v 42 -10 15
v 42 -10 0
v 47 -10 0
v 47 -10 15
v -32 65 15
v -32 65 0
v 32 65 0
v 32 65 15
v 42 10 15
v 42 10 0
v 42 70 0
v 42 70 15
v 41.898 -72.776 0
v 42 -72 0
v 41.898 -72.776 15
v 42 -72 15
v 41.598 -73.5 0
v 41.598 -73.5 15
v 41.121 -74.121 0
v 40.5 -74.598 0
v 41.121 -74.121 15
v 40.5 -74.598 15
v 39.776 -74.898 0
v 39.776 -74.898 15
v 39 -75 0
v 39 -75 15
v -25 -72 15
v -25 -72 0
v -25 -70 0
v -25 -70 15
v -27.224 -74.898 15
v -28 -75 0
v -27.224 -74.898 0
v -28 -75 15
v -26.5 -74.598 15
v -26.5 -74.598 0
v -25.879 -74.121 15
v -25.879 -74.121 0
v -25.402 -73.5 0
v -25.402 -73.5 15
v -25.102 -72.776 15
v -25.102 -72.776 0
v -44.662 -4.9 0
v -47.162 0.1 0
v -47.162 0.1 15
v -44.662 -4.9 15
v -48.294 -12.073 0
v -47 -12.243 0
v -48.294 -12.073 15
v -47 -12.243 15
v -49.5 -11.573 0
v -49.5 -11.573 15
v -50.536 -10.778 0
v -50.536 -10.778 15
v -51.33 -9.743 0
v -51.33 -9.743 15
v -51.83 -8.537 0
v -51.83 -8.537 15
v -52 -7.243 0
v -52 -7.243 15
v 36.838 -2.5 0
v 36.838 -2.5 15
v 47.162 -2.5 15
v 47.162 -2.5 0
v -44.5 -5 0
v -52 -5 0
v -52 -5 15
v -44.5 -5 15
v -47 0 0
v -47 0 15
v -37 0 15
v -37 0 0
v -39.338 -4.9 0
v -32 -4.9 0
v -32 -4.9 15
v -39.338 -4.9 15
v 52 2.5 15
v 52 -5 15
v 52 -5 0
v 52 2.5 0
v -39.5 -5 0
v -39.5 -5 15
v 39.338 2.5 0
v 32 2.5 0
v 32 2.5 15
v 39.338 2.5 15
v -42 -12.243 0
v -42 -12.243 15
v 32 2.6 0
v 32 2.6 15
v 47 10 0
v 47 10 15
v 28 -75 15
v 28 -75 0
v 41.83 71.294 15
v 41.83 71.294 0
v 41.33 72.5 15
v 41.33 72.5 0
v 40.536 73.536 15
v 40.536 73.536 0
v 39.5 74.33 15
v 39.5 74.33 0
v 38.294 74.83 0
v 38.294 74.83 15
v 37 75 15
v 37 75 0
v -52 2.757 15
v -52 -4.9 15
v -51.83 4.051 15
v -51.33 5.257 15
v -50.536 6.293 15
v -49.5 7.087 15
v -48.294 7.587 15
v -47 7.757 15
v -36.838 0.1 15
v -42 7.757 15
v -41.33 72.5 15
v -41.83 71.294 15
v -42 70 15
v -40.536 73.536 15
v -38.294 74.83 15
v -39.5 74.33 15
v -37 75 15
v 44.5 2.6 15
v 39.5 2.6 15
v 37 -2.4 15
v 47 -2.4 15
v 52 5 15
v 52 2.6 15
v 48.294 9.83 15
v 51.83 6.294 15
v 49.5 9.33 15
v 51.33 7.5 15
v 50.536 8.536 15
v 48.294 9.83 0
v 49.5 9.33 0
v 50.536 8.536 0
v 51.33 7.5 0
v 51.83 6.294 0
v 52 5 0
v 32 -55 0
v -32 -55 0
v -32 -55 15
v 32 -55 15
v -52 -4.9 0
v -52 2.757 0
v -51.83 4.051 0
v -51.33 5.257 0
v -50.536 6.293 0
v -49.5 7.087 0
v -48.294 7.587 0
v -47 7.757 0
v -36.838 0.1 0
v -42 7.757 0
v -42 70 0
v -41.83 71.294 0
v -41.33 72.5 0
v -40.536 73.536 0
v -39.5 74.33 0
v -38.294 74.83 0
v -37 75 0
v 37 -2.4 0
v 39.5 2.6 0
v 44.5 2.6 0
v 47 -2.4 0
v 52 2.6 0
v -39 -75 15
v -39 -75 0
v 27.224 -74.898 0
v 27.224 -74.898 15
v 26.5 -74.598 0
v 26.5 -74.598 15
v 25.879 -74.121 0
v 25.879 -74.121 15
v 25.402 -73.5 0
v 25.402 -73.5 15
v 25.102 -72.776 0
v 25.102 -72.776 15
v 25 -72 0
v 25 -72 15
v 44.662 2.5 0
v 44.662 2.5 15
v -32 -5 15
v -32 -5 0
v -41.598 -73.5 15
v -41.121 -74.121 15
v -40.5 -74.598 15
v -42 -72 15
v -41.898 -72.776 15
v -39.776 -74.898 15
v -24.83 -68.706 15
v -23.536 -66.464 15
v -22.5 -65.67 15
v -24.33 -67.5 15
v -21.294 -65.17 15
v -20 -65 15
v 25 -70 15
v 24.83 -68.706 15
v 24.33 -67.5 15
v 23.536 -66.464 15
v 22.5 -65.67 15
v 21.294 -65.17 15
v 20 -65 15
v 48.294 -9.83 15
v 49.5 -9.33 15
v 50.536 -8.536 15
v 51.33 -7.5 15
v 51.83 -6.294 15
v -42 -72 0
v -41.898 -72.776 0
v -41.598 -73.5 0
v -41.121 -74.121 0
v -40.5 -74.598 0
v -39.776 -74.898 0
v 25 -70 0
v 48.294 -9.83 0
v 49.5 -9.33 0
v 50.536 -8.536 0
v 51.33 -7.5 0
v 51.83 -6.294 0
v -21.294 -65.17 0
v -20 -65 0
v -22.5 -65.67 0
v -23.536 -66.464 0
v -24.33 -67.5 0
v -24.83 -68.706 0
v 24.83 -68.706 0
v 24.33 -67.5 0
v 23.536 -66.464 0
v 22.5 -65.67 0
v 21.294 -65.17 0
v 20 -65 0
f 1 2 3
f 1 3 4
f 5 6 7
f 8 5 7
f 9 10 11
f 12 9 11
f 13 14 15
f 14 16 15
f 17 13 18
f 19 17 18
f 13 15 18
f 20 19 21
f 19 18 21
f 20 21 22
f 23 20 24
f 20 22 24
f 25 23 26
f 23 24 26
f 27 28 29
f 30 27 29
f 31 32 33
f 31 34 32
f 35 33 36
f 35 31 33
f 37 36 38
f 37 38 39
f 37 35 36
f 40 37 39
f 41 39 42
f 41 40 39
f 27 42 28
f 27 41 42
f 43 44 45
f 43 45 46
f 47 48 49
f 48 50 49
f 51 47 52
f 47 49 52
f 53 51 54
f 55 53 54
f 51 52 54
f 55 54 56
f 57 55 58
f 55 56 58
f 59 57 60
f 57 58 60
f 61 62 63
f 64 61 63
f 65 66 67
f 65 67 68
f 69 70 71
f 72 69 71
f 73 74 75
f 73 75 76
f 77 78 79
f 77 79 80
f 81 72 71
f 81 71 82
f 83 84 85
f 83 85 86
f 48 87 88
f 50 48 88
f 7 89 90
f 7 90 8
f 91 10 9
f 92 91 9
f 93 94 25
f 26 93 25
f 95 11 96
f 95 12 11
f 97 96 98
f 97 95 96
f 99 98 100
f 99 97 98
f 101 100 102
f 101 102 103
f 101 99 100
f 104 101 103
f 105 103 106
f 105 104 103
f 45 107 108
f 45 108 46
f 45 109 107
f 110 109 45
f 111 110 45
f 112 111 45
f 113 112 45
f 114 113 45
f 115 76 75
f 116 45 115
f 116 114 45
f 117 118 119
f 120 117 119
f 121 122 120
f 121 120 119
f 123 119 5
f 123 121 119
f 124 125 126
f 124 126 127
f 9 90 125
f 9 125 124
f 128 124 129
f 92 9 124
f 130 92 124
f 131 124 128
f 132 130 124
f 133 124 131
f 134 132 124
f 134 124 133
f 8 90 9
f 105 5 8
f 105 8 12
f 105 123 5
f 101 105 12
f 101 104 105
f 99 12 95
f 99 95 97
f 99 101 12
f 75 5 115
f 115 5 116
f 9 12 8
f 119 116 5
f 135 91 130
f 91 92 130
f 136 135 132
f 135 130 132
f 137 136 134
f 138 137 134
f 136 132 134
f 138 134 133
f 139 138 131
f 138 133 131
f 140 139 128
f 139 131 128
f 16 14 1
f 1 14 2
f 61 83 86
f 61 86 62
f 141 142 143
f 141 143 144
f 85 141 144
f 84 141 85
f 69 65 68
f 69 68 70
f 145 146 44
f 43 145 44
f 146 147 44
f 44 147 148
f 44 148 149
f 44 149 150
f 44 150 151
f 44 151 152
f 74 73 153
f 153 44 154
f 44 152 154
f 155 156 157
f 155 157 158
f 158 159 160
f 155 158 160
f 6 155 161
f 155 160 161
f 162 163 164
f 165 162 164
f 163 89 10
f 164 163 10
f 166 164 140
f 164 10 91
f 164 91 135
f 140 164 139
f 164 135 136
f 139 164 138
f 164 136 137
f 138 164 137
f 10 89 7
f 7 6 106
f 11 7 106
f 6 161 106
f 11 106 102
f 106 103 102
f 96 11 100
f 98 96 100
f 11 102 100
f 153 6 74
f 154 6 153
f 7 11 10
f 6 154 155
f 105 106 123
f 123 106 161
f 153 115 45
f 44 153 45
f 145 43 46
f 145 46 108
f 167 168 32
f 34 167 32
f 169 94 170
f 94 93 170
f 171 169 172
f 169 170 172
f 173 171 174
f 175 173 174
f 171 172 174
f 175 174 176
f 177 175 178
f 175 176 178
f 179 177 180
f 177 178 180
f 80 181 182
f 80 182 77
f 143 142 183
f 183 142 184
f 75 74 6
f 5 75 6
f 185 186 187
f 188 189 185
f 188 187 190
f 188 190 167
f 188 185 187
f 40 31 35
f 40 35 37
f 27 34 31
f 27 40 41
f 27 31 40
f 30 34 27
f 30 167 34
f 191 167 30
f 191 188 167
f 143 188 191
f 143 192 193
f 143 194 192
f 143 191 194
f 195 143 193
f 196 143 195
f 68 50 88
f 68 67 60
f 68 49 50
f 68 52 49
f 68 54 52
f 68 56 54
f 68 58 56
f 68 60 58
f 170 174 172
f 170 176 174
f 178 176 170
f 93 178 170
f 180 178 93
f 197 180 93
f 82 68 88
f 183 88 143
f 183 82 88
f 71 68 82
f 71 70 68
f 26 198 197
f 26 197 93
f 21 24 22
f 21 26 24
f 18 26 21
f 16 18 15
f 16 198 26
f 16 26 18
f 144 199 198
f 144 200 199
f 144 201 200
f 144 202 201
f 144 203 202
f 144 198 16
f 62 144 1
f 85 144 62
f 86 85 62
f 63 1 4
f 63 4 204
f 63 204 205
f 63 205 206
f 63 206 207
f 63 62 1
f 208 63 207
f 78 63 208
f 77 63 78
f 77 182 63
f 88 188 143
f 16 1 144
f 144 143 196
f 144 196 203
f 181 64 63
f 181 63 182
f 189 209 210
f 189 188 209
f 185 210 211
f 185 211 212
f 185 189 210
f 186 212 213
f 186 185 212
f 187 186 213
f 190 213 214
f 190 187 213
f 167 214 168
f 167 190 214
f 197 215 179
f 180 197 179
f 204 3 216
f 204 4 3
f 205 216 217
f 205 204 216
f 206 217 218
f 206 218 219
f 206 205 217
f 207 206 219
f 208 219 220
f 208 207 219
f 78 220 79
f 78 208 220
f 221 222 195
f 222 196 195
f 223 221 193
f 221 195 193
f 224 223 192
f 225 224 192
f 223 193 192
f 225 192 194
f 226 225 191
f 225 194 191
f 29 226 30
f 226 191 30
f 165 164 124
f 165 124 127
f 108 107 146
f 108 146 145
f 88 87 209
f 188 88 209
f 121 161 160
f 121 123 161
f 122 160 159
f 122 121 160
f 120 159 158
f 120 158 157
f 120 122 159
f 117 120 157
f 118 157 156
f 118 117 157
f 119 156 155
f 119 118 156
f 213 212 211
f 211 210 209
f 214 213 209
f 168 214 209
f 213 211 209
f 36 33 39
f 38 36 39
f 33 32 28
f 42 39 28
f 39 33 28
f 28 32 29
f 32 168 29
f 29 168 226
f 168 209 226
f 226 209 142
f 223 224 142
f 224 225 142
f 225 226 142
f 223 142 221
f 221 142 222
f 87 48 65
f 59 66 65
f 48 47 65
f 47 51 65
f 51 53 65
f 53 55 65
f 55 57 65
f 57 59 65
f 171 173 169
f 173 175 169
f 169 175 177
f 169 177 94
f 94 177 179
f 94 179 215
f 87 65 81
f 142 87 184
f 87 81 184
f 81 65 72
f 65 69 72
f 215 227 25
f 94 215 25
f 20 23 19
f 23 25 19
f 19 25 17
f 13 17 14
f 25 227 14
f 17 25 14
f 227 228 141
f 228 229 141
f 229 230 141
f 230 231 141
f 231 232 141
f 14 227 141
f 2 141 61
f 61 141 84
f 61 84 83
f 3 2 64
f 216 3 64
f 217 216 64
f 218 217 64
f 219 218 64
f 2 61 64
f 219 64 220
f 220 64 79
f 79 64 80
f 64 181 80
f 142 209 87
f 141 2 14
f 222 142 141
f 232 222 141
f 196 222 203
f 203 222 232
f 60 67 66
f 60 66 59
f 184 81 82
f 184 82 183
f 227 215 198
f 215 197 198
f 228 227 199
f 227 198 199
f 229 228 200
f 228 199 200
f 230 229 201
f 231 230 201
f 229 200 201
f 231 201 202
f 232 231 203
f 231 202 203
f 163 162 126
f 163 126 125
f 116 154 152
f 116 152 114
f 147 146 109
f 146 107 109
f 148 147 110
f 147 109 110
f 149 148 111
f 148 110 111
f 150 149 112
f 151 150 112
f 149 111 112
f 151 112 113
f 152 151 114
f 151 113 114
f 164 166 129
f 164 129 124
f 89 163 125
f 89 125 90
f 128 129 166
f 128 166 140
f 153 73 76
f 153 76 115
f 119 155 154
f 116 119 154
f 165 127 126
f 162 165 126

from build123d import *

# Parameters (mm, degrees)
F0_W          = 64
F0_H          = 120
F1_DEPTH      = 15
F2_R          = 3
F3_R          = 5
F4_W          = 20
F4_H          = 15
F5_DEPTH      = 10
F6_W          = 20
F6_H          = 15
F7_DEPTH      = 10
F9_DEPTH      = 15.001
F9_DEPTH_BACK = 191
F10_R         = 5


# Not quite as in the source:
# - an extrude ends at something that could not be found from the text; its depth is read off the source's solid


with BuildPart() as f1:
    # F0 (on Top) → F1 (new body)
    with BuildSketch(Plane.XY):
        Polygon((42, -75), (42, 75), (-42, 75), (-42, -75), (-25, -75), (-25, -65), (25, -65), (25, -75), align=None)
        with Locations((0, 5)):
            Rectangle(F0_W, F0_H, mode=Mode.SUBTRACT)
    extrude(amount=F1_DEPTH)

    # F2
    f2_edges = [f1.edges().sort_by_distance(p)[0] for p in [
        (25, -75, 7.5),
        (42, -75, 7.5),
        (-25, -75, 7.5),
        (-42, -75, 7.5),
    ]]
    fillet(f2_edges, radius=F2_R)

    # F3
    f3_edges = [f1.edges().sort_by_distance(p)[0] for p in [
        (-25, -65, 7.5),
        (25, -65, 7.5),
        (-42, 75, 7.5),
        (42, 75, 7.5),
    ]]
    fillet(f3_edges, radius=F3_R)

    # F4 (on face) → F5 (join)
    with BuildSketch(Plane(origin=(-42, 0, 0), x_dir=(0, -1, 0), z_dir=(-1, 0, 0))):
        with Locations((2.2429061755, 7.5)):
            Rectangle(F4_W, F4_H)
    extrude(amount=F5_DEPTH)

    # F6 (on face) → F7 (join)
    with BuildSketch(Plane.YZ.offset(42)):
        with Locations((0, 7.5)):
            Rectangle(F6_W, F6_H)
    extrude(amount=F7_DEPTH)

    # F8 (on face) → F9 (cut, two sides)
    with BuildSketch(Plane.XY.offset(15)) as f9_sk:
        Polygon((-44.5, -5), (-47, 0), (-37, 0), (-39.5, -5), (-31.7807010276, -5), (-31.188910827, -5), (-31.188910827, -4.9), (-39.3381966011, -4.9), (-36.8381966011, 0.1), (-47.1618033989, 0.1), (-44.6618033989, -4.9), (-53.2719284122, -4.9), (-53.2719284122, -5), align=None)
        Polygon((44.6618033989, 2.5), (52.811089173, 2.5), (52.811089173, 2.6), (44.5, 2.6), (47, -2.4), (37, -2.4), (39.5, 2.6), (30.7280715878, 2.6), (30.7280715878, 2.5), (39.3381966011, 2.5), (36.8381966011, -2.5), (47.1618033989, -2.5), align=None)
    extrude(amount=-F9_DEPTH, mode=Mode.SUBTRACT)
    extrude(f9_sk.sketch, amount=F9_DEPTH_BACK, mode=Mode.SUBTRACT)

    # F10
    f10_edges = [f1.edges().sort_by_distance(p)[0] for p in [
        (52, -10, 7.5),
        (52, 10, 7.5),
        (-52, 7.757094, 7.5),
        (-52, -12.242906, 7.5),
    ]]
    fillet(f10_edges, radius=F10_R)


solid = f1.part
